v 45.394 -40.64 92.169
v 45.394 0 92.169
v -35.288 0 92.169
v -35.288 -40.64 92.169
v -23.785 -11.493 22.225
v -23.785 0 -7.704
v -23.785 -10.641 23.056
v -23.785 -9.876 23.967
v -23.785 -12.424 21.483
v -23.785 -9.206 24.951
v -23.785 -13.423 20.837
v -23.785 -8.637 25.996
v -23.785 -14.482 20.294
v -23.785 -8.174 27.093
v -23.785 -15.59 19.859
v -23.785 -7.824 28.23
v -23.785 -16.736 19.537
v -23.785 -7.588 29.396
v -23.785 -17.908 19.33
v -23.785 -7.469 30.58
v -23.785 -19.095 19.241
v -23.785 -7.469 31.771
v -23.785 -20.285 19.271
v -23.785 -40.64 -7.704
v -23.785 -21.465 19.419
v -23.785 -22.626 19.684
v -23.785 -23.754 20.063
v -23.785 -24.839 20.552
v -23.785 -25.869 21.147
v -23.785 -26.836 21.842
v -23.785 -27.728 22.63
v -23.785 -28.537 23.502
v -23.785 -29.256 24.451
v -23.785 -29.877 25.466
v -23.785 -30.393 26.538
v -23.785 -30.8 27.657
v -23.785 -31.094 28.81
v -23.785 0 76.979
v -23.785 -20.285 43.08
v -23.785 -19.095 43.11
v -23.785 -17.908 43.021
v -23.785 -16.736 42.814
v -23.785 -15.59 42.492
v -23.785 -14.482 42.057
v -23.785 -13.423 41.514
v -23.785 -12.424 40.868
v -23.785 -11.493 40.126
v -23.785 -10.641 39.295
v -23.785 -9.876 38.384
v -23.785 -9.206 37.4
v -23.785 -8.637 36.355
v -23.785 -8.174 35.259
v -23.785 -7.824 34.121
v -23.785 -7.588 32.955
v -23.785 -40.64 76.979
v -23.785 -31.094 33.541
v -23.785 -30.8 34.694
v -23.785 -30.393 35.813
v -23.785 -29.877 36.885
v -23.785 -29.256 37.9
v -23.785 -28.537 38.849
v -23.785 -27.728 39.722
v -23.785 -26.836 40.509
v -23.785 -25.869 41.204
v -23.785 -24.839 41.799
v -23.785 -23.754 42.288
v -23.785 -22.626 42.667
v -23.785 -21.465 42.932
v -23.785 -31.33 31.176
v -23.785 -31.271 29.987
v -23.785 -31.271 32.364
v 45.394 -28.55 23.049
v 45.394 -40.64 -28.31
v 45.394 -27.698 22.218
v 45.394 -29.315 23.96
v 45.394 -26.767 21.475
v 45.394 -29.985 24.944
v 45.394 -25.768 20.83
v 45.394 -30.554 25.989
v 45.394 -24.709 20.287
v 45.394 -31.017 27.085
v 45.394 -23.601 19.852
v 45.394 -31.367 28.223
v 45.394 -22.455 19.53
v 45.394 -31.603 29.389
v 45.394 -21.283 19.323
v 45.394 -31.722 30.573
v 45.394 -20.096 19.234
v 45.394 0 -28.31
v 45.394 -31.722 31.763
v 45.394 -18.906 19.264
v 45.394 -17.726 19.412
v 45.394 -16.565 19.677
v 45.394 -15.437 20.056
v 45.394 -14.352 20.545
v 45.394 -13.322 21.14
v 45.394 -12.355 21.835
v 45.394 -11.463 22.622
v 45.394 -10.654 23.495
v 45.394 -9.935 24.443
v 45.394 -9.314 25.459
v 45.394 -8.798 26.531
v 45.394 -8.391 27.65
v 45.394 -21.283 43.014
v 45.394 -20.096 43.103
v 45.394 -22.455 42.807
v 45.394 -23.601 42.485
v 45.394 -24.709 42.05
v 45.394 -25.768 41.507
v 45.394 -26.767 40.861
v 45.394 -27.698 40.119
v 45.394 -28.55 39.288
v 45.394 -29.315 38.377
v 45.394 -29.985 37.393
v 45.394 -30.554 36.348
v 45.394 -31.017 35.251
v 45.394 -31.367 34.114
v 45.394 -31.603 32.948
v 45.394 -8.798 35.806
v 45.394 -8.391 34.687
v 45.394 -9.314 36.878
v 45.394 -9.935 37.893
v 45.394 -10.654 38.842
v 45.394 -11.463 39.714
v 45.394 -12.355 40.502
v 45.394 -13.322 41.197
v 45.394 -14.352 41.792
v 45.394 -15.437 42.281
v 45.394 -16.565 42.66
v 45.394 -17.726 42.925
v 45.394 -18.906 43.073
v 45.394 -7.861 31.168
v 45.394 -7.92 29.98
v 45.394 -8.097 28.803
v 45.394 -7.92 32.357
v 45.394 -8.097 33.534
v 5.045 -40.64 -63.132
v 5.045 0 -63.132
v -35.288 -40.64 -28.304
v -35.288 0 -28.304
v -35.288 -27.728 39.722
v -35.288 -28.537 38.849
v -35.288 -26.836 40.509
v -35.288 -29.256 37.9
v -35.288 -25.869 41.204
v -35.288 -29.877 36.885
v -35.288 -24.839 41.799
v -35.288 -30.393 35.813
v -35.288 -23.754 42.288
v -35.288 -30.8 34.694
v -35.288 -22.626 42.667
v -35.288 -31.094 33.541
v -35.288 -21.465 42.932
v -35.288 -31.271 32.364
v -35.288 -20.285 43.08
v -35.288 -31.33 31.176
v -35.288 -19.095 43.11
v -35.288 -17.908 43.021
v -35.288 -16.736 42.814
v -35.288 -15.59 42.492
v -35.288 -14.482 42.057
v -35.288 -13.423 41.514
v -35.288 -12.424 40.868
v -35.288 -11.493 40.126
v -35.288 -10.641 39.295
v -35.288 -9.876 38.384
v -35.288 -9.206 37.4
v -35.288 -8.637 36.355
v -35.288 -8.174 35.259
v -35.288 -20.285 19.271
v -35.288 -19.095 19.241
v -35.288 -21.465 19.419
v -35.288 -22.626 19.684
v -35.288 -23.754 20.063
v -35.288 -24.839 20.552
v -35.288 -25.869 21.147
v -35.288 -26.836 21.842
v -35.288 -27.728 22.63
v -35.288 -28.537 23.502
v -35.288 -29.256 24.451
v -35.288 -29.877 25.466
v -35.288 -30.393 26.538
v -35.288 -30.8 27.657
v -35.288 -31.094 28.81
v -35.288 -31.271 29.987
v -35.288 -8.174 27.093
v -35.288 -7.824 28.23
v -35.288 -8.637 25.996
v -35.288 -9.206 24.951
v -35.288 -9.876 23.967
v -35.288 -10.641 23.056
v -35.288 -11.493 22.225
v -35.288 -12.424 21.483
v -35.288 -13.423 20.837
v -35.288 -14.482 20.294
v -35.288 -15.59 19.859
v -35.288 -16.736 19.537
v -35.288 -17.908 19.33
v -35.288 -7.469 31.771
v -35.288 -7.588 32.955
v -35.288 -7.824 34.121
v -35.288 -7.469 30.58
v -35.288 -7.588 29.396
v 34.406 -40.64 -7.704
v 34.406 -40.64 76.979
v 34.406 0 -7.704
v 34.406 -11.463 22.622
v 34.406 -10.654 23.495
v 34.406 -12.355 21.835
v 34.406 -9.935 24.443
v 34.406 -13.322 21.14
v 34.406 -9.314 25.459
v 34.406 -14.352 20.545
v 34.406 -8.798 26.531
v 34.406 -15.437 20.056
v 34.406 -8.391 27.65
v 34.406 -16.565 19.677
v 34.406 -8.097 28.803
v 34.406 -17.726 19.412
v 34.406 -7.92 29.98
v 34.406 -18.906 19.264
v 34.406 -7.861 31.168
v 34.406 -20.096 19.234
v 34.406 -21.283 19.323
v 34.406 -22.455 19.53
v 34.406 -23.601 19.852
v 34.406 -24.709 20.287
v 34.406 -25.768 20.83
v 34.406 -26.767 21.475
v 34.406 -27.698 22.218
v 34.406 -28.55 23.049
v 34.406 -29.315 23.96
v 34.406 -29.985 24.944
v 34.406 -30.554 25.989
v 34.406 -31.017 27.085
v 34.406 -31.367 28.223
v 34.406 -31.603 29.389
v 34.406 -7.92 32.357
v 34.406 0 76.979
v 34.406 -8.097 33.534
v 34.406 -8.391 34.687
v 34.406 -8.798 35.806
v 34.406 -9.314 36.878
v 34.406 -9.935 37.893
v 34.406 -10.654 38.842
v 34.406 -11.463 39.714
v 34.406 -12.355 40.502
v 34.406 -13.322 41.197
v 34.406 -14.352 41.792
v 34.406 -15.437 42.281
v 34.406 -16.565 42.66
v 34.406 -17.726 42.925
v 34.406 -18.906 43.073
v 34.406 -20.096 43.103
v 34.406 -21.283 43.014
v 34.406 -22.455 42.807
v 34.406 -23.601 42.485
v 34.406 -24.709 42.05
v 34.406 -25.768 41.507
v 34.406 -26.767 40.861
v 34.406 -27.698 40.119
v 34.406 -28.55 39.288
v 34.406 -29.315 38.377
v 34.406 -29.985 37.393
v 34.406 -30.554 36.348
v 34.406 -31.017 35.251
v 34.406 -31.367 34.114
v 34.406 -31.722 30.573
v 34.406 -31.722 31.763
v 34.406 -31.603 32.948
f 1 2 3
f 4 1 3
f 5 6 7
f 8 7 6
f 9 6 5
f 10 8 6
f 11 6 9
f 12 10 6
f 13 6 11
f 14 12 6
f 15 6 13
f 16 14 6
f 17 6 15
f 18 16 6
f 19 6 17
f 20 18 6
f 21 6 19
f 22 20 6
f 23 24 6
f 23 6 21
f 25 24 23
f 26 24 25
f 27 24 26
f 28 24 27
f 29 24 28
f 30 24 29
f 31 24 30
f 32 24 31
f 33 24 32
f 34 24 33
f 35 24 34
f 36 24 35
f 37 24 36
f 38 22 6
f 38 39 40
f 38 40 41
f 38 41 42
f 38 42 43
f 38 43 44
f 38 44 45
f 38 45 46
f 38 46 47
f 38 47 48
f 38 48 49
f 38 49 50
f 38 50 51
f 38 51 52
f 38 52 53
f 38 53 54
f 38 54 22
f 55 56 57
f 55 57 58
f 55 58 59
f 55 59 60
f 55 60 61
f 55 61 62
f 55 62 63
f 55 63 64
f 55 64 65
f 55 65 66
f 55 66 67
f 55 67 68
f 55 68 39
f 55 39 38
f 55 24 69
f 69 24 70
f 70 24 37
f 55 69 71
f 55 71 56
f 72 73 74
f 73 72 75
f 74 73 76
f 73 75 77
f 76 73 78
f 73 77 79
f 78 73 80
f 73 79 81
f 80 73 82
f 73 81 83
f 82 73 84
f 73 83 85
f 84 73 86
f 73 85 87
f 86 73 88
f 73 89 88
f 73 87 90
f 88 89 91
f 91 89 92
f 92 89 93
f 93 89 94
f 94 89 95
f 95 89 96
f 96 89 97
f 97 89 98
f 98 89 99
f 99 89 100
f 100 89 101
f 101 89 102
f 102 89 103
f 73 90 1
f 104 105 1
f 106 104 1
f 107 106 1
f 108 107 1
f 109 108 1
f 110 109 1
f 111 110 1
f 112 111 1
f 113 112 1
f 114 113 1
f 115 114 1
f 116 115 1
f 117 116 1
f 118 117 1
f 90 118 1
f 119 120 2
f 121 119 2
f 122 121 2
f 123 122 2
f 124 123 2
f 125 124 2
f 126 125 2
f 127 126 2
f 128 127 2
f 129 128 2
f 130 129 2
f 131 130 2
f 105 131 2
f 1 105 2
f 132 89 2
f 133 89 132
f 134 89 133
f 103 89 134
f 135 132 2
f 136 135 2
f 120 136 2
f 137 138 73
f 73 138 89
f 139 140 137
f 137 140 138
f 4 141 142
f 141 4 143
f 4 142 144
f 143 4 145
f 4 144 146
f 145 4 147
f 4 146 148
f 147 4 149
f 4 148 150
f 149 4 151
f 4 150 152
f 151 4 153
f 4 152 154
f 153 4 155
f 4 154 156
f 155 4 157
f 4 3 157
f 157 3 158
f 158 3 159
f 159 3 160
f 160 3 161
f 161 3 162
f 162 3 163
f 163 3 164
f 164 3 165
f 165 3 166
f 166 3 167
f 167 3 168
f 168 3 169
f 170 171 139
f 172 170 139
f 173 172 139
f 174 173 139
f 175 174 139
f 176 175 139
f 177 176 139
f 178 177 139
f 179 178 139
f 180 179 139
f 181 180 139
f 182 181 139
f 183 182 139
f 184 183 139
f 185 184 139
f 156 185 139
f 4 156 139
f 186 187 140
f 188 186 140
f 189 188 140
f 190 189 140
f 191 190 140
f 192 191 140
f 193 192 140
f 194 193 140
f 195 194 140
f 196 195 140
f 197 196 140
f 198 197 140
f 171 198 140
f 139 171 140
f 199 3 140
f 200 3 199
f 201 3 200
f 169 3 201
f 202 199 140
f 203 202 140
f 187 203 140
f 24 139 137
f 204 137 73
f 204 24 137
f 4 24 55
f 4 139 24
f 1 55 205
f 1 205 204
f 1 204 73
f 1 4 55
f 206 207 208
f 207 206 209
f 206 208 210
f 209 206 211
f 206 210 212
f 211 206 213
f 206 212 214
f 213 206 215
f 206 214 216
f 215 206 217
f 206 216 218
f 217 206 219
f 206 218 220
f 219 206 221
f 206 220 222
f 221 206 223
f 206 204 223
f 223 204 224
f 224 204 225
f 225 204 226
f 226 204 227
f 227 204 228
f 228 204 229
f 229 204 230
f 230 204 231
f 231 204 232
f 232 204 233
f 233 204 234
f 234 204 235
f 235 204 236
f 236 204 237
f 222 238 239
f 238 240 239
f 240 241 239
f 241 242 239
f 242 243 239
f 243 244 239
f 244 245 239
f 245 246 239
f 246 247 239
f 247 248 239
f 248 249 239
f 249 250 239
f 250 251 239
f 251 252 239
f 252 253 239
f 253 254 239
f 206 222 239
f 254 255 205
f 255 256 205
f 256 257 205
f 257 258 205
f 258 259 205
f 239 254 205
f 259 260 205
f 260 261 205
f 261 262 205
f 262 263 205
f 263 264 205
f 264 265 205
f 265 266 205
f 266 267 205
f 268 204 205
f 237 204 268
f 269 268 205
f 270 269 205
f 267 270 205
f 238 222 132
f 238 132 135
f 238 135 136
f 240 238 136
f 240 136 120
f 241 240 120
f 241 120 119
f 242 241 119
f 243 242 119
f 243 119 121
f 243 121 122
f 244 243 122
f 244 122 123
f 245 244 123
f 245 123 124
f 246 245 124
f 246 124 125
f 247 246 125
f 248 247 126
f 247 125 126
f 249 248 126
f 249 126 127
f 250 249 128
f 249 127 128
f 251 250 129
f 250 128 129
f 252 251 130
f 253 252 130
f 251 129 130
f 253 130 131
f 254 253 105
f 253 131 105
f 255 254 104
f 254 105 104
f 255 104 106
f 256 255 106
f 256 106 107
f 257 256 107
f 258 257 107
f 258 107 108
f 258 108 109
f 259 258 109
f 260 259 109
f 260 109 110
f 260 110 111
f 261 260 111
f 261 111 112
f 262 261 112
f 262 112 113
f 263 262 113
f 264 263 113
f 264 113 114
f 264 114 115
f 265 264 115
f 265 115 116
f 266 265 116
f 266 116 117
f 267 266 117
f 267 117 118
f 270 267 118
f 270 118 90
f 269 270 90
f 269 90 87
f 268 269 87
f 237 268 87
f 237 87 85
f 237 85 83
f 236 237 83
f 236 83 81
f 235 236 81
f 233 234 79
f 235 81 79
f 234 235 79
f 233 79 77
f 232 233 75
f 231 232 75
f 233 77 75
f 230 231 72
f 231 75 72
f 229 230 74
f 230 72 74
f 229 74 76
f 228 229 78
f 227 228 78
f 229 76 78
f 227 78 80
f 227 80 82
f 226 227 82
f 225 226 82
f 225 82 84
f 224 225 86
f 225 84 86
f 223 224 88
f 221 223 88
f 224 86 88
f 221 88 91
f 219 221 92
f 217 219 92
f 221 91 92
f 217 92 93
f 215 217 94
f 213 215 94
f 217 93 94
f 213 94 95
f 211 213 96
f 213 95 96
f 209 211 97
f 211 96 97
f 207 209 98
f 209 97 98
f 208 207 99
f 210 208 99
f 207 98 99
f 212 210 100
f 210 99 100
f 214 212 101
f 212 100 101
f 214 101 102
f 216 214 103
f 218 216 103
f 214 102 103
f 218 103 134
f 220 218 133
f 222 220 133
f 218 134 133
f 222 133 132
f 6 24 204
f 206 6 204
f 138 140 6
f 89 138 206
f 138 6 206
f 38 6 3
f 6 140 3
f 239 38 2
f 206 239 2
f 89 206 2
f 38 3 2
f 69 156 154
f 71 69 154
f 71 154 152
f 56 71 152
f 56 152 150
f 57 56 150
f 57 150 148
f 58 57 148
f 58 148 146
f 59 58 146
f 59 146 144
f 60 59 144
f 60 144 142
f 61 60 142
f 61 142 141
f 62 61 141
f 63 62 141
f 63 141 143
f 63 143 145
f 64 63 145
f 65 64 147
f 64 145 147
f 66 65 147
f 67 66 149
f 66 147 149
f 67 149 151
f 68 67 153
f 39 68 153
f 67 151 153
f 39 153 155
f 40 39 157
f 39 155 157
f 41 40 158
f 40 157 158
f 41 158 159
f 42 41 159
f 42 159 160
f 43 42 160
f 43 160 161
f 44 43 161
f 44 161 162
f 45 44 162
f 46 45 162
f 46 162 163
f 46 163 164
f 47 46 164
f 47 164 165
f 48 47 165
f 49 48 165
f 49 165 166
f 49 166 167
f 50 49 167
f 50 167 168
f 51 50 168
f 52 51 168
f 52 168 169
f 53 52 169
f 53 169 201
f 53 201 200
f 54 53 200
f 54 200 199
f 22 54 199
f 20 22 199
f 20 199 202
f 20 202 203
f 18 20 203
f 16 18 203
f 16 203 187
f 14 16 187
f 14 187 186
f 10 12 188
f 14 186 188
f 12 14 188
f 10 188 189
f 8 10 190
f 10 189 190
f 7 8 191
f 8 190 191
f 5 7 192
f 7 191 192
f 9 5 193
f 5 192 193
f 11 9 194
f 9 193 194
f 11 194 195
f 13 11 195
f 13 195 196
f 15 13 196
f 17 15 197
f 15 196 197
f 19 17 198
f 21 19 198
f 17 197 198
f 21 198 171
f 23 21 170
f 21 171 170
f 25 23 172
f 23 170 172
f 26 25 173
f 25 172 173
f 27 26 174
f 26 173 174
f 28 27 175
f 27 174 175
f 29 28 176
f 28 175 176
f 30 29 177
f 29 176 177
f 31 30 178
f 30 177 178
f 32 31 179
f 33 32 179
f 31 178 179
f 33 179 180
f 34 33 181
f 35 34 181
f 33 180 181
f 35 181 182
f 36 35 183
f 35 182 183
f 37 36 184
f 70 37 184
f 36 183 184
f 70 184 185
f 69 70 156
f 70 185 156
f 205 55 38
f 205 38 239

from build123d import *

# Parameters (mm, degrees)
F1_DEPTH = 40.64
F2_W     = 58.1915168336
F2_H     = 84.6826420166
F3_DEPTH = 100.584
F4_DEPTH = 25.4
F5_R     = 11.938
F6_DEPTH = 25.4
F7_R     = 11.938
F8_DEPTH = 25.4


# Not quite as in the source:
# - a feature names something its author has since deleted; it is built from what else it names


with BuildPart() as f1:
    # F0 (on Front) → F1 (new body)
    with BuildSketch(Plane.XZ):
        Polygon((5.0445693985, -63.1324924332), (45.3936140645, -28.3097998209), (45.3936140645, 92.1692103148), (-35.2877192199, 92.1692103148), (-35.2877192199, -28.3036921173), align=None)
    extrude(amount=F1_DEPTH)

    # F2 (on face) → F3 (cut)
    with BuildSketch(Plane.XZ.offset(40.64)):
        with Locations((5.3103963967, 34.6377051901)):
            Rectangle(F2_W, F2_H)
    extrude(amount=-F3_DEPTH, mode=Mode.SUBTRACT)

    # F2 (on face) → F4 (cut)
    with BuildSketch(Plane.XZ.offset(40.64)):
        with Locations((5.3103963967, 34.6377051901)):
            Rectangle(F2_W, F2_H)
    extrude(amount=-F4_DEPTH, mode=Mode.SUBTRACT)

    # F5 (on face) → F6 (cut)
    with BuildSketch(Plane(origin=(-35.2877192199, 0, 0), x_dir=(0, -1, 0), z_dir=(-1, 0, 0))):
        with Locations((19.3923822703, 31.1755515458)):
            Circle(F5_R)
    extrude(amount=-F6_DEPTH, mode=Mode.SUBTRACT)

    # F7 (on face) → F8 (cut)
    with BuildSketch(Plane.YZ.offset(45.3936140645)):
        with Locations((-19.7985949944, 31.1684036463)):
            Circle(F7_R)
    extrude(amount=-F8_DEPTH, mode=Mode.SUBTRACT)


solid = f1.part
